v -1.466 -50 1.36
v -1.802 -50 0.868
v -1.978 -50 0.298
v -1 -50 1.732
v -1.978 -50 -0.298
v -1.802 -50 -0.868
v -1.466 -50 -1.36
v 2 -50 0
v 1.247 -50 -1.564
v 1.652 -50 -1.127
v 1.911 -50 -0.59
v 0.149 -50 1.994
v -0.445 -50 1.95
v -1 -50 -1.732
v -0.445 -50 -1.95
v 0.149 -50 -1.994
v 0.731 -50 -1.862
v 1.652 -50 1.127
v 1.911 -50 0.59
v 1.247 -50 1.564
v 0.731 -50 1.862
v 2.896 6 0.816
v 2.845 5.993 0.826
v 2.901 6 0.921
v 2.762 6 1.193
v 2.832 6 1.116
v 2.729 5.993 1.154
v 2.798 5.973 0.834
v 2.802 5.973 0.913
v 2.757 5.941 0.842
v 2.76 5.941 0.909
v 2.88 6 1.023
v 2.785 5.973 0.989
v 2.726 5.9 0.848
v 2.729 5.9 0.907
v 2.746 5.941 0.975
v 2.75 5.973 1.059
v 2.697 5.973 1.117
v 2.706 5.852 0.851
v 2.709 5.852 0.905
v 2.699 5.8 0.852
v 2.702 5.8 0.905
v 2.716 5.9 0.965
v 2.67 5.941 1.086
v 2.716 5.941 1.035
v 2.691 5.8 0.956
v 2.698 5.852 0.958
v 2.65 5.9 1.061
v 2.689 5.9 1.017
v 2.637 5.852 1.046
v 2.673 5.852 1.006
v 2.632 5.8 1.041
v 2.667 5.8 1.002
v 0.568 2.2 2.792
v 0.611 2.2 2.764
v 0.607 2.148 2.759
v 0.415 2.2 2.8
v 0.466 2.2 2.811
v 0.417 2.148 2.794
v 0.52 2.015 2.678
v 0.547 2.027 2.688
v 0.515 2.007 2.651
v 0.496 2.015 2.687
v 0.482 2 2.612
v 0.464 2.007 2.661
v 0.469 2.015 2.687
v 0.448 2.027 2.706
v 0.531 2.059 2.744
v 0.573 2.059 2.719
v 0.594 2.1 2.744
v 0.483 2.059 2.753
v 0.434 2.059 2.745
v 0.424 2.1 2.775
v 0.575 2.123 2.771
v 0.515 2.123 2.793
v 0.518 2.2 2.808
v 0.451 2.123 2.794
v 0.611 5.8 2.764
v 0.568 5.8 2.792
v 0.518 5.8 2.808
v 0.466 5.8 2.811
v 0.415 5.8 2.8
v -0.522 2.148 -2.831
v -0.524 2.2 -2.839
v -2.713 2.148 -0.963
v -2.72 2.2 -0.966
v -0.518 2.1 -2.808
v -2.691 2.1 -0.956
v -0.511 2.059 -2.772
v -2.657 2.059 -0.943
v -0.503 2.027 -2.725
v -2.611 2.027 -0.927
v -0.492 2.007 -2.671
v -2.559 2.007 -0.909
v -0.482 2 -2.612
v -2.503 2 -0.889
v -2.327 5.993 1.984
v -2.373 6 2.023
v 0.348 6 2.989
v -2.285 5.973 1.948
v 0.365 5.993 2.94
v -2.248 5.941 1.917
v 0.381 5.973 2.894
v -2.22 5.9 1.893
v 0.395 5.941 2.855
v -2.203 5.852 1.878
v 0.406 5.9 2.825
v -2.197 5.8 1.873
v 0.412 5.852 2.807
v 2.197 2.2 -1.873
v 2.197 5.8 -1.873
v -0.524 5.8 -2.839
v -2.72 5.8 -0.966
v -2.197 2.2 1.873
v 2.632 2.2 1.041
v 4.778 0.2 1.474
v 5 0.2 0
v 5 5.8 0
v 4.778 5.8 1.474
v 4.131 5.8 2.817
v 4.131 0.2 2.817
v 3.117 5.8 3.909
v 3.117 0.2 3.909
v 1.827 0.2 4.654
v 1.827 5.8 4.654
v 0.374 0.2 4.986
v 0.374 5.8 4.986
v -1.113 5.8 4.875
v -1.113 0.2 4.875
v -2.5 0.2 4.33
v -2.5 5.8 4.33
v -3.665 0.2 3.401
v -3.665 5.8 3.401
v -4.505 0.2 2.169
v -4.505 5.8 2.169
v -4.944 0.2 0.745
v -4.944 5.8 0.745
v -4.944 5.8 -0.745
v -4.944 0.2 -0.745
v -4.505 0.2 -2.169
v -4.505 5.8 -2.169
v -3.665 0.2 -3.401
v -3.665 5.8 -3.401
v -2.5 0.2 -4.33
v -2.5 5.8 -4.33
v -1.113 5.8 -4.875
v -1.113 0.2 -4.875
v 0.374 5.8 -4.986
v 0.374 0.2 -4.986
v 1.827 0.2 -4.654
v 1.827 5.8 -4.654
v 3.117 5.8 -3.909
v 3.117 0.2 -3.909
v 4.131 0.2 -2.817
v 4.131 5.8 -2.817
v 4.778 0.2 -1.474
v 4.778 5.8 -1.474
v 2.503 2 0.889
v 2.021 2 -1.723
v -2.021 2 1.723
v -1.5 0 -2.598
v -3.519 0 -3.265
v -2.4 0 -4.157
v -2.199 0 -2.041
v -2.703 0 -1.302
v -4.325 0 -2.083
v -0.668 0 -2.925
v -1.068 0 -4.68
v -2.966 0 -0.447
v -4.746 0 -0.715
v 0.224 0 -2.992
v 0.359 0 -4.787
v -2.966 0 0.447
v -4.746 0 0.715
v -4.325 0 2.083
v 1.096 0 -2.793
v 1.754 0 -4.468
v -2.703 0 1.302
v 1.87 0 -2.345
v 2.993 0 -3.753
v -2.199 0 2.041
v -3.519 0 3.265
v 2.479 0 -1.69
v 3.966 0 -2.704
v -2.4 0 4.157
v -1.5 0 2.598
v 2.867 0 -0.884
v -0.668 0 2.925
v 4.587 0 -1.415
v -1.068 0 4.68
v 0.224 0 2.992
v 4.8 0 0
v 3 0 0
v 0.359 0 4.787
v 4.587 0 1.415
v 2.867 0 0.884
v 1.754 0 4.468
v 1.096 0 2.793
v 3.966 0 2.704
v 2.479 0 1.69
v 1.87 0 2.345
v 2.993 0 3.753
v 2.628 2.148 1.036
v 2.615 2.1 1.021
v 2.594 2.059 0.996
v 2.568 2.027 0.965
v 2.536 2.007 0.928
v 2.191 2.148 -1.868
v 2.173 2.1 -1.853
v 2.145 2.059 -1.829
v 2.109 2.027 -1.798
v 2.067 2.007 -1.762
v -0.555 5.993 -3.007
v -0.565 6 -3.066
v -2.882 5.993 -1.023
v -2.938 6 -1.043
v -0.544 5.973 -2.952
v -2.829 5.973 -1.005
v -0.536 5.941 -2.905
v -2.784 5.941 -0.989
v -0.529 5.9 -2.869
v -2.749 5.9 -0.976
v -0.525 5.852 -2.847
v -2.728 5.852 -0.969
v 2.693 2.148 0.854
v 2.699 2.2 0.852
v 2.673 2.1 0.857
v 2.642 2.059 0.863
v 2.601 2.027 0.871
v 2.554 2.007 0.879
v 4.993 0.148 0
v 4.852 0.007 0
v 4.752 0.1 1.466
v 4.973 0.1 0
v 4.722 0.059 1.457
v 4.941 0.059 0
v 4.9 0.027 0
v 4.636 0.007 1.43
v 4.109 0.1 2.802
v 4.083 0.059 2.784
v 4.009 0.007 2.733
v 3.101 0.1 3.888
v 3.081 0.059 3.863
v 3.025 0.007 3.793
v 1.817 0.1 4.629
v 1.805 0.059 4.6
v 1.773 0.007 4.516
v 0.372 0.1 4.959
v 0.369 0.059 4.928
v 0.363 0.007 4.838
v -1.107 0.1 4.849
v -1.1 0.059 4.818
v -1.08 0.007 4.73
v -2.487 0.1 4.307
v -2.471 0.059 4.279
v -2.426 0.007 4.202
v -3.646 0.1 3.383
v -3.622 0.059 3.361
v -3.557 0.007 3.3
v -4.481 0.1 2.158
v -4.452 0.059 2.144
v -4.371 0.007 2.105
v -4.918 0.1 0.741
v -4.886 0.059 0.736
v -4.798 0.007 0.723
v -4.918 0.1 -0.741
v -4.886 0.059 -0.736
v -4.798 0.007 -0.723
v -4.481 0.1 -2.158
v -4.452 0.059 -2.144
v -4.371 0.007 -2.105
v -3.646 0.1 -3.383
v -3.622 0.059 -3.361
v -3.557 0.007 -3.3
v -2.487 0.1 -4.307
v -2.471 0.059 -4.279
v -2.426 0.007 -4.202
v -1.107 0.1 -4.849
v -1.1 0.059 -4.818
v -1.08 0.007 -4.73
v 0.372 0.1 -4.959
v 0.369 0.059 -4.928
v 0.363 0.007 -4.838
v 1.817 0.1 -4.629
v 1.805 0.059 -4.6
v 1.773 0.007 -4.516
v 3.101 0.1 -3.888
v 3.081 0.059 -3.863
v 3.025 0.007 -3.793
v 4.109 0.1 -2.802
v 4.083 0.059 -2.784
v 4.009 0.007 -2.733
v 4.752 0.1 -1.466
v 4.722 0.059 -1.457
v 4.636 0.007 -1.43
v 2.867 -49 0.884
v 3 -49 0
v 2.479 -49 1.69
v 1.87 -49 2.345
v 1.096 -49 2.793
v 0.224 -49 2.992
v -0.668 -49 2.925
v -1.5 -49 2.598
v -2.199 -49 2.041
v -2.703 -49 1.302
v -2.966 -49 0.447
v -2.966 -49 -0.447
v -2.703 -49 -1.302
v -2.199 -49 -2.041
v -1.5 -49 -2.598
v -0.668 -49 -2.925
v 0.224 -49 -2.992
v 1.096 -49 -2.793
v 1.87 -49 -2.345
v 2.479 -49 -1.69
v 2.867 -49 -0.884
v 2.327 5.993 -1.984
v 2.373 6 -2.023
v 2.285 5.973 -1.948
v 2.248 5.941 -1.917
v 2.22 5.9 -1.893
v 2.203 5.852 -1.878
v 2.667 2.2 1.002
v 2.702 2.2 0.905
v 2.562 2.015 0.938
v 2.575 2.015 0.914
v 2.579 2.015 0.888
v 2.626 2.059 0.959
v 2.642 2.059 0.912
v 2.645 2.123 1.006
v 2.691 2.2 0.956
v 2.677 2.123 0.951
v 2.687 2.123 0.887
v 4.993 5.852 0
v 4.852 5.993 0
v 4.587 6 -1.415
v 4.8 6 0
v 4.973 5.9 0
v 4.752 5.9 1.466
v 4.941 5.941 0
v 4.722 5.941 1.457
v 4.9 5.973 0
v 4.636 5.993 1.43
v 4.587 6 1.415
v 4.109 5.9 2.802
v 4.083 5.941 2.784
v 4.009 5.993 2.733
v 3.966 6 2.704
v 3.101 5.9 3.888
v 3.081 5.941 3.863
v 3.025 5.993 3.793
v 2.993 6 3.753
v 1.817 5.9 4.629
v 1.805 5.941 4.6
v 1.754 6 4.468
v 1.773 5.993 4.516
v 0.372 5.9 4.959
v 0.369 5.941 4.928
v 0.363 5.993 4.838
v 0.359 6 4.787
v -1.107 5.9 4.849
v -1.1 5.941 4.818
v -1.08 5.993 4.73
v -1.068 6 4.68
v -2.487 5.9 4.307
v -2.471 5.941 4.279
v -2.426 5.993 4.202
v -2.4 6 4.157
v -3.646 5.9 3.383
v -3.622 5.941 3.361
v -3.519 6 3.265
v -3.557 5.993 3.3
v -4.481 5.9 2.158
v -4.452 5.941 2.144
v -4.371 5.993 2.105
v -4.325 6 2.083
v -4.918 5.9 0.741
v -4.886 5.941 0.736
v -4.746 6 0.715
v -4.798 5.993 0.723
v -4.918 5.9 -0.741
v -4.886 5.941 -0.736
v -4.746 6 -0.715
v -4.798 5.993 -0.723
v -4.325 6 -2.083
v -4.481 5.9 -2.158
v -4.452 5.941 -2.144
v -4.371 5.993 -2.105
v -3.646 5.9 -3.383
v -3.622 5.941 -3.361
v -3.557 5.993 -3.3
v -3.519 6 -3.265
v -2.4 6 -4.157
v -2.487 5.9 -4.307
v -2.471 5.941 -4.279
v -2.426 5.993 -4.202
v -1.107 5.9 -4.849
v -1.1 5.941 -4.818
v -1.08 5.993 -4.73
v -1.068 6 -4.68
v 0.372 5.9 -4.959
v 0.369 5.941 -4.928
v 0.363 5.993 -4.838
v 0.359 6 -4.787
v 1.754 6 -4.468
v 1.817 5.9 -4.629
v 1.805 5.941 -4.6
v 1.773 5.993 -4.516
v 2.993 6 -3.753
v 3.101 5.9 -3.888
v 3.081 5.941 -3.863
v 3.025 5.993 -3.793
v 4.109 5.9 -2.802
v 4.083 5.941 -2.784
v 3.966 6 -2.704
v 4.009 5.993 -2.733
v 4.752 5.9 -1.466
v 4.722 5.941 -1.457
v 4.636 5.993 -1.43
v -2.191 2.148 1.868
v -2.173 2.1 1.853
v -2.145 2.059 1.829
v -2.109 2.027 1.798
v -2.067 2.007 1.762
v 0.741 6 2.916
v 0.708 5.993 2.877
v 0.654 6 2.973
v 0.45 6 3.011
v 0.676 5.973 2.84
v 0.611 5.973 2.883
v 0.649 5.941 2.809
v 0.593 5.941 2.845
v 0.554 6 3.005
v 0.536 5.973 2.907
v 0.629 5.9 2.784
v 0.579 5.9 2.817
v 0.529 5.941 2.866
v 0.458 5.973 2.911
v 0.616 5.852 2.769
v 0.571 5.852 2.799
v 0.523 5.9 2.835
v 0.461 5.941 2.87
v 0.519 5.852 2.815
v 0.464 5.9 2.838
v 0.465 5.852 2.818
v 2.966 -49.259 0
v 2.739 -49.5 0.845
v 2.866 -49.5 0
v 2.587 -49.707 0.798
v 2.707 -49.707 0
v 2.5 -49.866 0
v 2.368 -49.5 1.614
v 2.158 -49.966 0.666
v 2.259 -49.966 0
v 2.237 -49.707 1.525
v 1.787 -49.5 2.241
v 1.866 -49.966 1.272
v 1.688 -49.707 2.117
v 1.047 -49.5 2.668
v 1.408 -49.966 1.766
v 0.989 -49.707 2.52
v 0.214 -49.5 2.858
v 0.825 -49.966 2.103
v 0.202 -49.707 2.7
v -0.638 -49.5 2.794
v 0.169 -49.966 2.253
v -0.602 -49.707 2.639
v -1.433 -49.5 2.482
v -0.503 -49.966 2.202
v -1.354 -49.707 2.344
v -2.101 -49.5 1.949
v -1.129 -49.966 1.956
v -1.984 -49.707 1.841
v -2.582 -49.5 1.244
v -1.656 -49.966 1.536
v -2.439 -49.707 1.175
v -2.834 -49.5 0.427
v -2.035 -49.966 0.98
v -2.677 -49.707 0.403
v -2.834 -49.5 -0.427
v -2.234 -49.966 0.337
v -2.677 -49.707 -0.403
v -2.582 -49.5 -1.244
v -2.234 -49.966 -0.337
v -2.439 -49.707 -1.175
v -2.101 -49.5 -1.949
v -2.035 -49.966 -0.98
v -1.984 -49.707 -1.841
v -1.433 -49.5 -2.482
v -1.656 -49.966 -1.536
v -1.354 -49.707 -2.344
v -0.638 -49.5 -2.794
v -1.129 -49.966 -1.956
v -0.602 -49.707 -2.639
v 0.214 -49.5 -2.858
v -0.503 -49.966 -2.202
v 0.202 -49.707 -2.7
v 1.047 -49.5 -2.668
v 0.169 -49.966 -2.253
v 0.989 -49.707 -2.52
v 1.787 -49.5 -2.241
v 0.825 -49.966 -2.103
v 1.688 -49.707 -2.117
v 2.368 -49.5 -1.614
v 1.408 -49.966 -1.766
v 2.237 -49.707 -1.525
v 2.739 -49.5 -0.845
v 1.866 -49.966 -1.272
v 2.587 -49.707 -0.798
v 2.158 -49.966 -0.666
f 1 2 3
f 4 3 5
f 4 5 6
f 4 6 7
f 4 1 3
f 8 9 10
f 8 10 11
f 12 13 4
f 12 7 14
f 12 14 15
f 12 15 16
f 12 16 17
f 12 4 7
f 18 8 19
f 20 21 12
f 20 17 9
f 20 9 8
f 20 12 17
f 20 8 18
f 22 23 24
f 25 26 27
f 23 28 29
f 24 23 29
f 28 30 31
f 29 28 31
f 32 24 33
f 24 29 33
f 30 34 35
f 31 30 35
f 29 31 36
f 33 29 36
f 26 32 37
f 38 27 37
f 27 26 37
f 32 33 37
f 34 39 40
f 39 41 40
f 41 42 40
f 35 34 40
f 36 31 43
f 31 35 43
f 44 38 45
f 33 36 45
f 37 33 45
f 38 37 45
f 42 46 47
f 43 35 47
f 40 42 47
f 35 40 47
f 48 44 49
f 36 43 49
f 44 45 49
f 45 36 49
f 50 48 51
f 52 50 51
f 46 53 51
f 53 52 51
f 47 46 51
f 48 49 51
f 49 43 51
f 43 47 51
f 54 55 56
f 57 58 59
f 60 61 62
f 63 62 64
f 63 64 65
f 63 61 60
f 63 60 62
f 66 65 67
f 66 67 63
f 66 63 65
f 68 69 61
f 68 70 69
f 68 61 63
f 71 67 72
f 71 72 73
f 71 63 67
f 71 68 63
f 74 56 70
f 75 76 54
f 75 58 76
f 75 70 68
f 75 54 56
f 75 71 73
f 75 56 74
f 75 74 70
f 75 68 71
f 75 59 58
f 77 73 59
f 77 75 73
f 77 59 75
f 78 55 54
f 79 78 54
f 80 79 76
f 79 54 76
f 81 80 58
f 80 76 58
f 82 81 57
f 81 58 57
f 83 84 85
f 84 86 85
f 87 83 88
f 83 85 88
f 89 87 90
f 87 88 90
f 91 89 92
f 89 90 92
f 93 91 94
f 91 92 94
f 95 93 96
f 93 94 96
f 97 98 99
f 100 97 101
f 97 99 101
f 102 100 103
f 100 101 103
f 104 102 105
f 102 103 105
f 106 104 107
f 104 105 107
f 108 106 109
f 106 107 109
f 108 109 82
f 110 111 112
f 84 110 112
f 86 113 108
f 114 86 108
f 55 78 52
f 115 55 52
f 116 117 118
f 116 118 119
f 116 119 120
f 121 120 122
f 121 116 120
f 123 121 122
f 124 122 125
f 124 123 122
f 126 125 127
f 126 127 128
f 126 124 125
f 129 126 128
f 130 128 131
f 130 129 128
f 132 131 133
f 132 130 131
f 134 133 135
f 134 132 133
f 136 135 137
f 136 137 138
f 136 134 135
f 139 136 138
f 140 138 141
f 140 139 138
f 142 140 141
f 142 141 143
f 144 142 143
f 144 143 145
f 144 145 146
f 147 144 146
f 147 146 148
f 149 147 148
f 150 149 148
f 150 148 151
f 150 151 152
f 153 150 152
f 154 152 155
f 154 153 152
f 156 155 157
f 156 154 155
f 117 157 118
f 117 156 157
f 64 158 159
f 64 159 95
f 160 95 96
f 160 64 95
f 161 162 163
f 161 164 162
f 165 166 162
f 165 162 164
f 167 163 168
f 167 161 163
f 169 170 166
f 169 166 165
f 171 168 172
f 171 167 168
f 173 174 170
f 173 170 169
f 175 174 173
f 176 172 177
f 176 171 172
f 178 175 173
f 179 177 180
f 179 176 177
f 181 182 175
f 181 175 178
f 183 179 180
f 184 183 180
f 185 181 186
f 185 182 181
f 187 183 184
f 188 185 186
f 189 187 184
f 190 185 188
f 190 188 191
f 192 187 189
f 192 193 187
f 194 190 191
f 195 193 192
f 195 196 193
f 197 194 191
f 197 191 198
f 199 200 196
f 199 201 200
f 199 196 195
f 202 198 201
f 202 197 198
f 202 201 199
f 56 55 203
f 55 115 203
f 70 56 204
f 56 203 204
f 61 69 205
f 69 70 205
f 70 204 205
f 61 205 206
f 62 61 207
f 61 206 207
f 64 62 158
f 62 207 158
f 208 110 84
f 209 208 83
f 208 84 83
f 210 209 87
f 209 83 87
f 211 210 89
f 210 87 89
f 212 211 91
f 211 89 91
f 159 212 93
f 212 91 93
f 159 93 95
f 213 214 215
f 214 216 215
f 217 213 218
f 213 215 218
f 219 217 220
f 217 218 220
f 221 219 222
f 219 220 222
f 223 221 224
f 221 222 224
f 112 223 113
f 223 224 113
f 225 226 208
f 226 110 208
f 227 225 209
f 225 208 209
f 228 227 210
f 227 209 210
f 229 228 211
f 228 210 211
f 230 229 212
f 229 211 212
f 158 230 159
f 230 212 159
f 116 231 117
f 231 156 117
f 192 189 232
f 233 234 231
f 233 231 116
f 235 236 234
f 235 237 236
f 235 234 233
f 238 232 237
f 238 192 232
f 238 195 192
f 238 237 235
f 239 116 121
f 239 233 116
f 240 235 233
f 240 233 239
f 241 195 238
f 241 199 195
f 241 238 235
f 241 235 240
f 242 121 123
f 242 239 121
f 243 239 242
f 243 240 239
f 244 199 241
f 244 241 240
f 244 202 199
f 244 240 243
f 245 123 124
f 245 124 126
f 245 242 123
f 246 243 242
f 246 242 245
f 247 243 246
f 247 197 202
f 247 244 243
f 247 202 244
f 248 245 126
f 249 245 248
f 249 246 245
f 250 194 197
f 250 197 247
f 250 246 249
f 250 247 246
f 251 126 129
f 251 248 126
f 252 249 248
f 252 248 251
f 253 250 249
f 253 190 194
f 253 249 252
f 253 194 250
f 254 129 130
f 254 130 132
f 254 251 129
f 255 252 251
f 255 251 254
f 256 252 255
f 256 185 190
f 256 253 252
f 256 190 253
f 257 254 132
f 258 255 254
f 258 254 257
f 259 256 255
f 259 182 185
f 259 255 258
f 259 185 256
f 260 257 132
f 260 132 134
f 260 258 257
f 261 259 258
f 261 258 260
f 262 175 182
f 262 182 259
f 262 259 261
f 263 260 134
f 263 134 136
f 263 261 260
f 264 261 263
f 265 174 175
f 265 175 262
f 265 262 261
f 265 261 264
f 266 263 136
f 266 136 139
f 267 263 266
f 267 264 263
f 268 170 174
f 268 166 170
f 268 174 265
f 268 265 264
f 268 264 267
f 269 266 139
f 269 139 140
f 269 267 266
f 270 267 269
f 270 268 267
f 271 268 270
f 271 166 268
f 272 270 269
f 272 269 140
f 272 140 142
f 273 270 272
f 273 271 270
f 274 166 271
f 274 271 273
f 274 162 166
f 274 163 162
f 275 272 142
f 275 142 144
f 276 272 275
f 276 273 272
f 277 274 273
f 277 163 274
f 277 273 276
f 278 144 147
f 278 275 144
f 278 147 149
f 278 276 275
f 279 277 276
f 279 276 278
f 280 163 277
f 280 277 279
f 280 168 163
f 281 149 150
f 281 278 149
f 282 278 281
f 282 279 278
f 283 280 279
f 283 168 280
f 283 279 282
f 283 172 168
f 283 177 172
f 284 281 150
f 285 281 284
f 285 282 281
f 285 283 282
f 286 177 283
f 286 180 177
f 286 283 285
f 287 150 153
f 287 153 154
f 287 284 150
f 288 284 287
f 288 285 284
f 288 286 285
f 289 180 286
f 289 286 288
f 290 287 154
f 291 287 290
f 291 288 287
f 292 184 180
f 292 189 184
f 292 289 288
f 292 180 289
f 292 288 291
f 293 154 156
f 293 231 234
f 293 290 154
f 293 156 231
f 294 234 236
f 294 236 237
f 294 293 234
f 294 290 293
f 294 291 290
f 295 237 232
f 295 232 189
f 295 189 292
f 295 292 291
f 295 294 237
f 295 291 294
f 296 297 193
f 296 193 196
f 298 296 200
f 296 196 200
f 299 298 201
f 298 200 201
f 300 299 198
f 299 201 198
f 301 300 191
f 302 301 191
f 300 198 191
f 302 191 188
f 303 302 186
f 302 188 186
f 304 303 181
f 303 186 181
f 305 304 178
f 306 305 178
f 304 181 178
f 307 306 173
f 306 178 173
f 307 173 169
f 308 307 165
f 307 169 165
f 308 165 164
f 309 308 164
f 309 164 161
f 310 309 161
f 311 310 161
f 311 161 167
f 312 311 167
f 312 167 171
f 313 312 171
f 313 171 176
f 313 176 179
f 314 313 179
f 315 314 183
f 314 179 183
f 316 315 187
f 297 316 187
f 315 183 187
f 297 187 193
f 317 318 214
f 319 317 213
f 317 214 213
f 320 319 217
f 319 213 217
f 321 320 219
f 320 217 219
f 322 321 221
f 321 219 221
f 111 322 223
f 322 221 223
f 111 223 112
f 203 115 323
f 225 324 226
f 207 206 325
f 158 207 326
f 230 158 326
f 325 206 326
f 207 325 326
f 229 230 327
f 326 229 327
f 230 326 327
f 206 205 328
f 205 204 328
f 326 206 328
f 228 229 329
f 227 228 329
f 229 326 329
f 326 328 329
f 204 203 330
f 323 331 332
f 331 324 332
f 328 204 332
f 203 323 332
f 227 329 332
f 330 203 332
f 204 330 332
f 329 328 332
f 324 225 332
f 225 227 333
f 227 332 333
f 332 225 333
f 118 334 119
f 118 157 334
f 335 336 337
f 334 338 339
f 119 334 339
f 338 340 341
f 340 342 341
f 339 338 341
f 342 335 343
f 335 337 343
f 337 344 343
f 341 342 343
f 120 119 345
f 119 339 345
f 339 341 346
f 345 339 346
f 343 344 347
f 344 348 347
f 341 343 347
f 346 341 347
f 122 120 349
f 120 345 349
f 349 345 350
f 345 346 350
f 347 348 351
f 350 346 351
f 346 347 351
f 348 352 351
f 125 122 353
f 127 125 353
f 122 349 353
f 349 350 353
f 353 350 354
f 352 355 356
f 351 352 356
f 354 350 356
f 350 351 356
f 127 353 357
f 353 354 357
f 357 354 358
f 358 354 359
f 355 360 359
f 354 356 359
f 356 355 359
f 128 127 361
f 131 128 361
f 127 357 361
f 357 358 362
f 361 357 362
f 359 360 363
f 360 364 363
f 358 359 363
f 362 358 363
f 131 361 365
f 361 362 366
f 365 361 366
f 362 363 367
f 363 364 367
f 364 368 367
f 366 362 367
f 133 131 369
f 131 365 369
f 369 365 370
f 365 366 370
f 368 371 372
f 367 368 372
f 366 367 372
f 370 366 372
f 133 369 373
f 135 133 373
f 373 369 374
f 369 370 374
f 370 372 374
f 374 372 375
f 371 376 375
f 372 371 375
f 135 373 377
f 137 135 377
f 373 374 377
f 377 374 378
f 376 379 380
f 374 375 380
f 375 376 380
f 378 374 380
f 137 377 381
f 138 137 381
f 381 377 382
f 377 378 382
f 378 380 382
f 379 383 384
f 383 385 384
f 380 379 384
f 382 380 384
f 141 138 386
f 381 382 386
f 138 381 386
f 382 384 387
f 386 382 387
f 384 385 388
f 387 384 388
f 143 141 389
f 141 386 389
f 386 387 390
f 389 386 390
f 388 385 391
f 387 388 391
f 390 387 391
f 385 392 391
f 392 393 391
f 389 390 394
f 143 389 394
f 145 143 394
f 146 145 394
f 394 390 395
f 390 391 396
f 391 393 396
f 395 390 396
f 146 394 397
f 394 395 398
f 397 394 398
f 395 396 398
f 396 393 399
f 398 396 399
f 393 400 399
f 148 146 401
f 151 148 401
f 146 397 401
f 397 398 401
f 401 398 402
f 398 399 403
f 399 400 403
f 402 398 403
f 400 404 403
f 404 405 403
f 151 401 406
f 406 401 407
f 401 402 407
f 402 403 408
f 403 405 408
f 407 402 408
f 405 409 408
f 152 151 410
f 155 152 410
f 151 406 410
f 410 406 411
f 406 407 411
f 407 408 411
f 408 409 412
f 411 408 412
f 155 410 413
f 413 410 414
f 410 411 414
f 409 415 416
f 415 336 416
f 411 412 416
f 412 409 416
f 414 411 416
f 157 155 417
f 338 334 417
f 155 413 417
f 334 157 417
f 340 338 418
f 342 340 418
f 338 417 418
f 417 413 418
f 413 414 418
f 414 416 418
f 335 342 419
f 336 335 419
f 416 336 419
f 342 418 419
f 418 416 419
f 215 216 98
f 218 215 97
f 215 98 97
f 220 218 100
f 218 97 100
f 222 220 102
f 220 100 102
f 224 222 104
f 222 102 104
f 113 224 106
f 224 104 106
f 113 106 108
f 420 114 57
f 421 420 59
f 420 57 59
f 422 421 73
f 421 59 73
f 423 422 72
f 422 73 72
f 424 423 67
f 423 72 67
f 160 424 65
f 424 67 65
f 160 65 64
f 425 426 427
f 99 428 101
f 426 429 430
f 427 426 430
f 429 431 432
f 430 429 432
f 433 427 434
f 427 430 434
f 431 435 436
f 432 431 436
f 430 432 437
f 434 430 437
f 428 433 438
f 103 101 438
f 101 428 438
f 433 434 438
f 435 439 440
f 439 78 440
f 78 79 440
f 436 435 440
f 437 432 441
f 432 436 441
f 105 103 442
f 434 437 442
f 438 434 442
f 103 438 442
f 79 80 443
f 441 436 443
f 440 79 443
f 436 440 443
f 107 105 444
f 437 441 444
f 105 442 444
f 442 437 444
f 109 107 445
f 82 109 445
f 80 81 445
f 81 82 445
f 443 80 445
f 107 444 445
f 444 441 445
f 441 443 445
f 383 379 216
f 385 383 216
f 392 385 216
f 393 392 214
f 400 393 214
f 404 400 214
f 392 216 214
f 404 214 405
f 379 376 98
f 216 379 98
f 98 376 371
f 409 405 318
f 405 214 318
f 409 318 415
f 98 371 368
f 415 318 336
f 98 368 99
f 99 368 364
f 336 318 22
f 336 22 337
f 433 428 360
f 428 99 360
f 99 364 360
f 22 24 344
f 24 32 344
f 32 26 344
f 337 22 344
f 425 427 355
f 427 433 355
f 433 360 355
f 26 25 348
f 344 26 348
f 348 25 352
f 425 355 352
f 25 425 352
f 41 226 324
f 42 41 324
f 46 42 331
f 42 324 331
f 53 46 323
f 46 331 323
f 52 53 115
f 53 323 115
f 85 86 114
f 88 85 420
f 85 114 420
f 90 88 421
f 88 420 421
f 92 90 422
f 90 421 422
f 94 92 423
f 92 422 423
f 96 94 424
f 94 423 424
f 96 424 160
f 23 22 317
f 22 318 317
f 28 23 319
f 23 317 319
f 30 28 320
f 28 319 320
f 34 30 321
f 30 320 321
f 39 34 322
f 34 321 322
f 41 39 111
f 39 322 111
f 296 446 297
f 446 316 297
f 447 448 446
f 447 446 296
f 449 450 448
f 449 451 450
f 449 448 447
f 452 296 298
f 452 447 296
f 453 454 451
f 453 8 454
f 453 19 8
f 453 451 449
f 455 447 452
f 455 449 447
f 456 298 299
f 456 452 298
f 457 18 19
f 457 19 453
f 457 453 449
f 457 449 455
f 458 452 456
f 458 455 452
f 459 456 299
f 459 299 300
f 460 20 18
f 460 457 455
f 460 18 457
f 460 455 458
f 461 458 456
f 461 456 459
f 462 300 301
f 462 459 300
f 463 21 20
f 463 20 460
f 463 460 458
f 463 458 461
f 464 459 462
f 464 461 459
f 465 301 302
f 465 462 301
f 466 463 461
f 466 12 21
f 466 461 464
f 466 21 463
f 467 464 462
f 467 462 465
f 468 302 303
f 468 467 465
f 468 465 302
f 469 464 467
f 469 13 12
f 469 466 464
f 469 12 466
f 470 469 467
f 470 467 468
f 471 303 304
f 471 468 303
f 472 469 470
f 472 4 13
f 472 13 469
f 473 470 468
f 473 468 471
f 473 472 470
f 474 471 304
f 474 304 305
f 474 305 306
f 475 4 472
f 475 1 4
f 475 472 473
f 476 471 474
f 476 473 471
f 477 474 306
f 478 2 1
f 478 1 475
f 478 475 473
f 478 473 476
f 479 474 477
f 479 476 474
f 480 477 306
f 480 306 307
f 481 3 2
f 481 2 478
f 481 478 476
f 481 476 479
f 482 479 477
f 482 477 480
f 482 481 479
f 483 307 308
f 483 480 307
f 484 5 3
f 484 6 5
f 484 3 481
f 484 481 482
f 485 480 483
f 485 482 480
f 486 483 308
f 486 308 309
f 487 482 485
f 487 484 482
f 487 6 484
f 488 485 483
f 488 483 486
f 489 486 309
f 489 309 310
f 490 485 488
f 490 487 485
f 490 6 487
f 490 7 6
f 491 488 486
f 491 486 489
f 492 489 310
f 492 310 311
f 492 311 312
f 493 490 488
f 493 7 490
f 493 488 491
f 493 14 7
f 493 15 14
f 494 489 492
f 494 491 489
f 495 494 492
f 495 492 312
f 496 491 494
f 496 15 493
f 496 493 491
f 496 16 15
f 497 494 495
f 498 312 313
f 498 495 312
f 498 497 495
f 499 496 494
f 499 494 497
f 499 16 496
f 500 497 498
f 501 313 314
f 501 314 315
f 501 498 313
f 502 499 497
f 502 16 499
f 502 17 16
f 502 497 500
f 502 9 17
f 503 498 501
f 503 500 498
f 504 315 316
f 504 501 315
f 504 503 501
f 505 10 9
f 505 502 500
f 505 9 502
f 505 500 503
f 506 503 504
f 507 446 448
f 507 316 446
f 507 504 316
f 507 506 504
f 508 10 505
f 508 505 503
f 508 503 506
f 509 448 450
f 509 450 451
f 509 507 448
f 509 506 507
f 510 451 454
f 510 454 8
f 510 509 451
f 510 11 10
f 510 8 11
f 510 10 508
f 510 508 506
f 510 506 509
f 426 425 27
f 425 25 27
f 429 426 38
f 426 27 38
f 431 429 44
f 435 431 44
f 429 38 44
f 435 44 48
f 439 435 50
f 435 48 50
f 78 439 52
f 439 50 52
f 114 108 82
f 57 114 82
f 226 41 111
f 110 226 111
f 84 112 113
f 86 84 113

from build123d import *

# Parameters (mm, degrees)
F0_R     = 3
F1_DEPTH = 50
F0_R_2   = 5
F2_DEPTH = 6
F4_DEPTH = 4
F5_R     = 0.2
F6_R     = 1


with BuildPart() as f1:
    # F0 (on Front) → F1 (new body)
    with BuildSketch(Plane.XZ):
        Circle(F0_R)
    extrude(amount=F1_DEPTH)

    # F0 (on Front) → F2 (join)
    with BuildSketch(Plane.XZ):
        Circle(F0_R_2)
        Circle(F0_R, mode=Mode.SUBTRACT)
        Circle(F0_R)
    extrude(amount=-F2_DEPTH)

    # F3 (on face) → F4 (cut)
    with BuildSketch(Plane(origin=(0, 6, 0), x_dir=(-1, 0, 0), z_dir=(0, 1, 0))):
        Polygon((2.196781, 1.872829), (-0.523527, 2.838882), (-2.720308, 0.966054), (-2.196781, -1.872829), (0.523527, -2.838882), (2.720308, -0.966054), align=None)
    extrude(amount=-F4_DEPTH, mode=Mode.SUBTRACT)

    # F5
    f5_edges = [f1.edges().sort_by_distance(p)[0] for p in [
        (-5, 6, 0),
        (-5, 0, 0),
        (0.836627, 6, -2.355855),
        (-1.621917, 6, -1.902468),
        (-2.458544, 6, 0.453387),
        (2.458544, 6, -0.453387),
        (1.621917, 6, 1.902468),
        (-0.836627, 6, 2.355855),
        (-1.621917, 2, -1.902468),
        (0.836627, 2, -2.355855),
        (2.458544, 2, -0.453387),
        (0.523527, 4, 2.838882),
        (2.720308, 4, 0.966054),
        (1.621917, 2, 1.902468),
        (-0.836627, 2, 2.355855),
        (-2.458544, 2, 0.453387),
    ]]
    fillet(f5_edges, radius=F5_R)

    # F6
    f6_edges = [f1.edges().sort_by_distance(p)[0] for p in [
        (-3, -50, 0),
    ]]
    fillet(f6_edges, radius=F6_R)


solid = f1.part
